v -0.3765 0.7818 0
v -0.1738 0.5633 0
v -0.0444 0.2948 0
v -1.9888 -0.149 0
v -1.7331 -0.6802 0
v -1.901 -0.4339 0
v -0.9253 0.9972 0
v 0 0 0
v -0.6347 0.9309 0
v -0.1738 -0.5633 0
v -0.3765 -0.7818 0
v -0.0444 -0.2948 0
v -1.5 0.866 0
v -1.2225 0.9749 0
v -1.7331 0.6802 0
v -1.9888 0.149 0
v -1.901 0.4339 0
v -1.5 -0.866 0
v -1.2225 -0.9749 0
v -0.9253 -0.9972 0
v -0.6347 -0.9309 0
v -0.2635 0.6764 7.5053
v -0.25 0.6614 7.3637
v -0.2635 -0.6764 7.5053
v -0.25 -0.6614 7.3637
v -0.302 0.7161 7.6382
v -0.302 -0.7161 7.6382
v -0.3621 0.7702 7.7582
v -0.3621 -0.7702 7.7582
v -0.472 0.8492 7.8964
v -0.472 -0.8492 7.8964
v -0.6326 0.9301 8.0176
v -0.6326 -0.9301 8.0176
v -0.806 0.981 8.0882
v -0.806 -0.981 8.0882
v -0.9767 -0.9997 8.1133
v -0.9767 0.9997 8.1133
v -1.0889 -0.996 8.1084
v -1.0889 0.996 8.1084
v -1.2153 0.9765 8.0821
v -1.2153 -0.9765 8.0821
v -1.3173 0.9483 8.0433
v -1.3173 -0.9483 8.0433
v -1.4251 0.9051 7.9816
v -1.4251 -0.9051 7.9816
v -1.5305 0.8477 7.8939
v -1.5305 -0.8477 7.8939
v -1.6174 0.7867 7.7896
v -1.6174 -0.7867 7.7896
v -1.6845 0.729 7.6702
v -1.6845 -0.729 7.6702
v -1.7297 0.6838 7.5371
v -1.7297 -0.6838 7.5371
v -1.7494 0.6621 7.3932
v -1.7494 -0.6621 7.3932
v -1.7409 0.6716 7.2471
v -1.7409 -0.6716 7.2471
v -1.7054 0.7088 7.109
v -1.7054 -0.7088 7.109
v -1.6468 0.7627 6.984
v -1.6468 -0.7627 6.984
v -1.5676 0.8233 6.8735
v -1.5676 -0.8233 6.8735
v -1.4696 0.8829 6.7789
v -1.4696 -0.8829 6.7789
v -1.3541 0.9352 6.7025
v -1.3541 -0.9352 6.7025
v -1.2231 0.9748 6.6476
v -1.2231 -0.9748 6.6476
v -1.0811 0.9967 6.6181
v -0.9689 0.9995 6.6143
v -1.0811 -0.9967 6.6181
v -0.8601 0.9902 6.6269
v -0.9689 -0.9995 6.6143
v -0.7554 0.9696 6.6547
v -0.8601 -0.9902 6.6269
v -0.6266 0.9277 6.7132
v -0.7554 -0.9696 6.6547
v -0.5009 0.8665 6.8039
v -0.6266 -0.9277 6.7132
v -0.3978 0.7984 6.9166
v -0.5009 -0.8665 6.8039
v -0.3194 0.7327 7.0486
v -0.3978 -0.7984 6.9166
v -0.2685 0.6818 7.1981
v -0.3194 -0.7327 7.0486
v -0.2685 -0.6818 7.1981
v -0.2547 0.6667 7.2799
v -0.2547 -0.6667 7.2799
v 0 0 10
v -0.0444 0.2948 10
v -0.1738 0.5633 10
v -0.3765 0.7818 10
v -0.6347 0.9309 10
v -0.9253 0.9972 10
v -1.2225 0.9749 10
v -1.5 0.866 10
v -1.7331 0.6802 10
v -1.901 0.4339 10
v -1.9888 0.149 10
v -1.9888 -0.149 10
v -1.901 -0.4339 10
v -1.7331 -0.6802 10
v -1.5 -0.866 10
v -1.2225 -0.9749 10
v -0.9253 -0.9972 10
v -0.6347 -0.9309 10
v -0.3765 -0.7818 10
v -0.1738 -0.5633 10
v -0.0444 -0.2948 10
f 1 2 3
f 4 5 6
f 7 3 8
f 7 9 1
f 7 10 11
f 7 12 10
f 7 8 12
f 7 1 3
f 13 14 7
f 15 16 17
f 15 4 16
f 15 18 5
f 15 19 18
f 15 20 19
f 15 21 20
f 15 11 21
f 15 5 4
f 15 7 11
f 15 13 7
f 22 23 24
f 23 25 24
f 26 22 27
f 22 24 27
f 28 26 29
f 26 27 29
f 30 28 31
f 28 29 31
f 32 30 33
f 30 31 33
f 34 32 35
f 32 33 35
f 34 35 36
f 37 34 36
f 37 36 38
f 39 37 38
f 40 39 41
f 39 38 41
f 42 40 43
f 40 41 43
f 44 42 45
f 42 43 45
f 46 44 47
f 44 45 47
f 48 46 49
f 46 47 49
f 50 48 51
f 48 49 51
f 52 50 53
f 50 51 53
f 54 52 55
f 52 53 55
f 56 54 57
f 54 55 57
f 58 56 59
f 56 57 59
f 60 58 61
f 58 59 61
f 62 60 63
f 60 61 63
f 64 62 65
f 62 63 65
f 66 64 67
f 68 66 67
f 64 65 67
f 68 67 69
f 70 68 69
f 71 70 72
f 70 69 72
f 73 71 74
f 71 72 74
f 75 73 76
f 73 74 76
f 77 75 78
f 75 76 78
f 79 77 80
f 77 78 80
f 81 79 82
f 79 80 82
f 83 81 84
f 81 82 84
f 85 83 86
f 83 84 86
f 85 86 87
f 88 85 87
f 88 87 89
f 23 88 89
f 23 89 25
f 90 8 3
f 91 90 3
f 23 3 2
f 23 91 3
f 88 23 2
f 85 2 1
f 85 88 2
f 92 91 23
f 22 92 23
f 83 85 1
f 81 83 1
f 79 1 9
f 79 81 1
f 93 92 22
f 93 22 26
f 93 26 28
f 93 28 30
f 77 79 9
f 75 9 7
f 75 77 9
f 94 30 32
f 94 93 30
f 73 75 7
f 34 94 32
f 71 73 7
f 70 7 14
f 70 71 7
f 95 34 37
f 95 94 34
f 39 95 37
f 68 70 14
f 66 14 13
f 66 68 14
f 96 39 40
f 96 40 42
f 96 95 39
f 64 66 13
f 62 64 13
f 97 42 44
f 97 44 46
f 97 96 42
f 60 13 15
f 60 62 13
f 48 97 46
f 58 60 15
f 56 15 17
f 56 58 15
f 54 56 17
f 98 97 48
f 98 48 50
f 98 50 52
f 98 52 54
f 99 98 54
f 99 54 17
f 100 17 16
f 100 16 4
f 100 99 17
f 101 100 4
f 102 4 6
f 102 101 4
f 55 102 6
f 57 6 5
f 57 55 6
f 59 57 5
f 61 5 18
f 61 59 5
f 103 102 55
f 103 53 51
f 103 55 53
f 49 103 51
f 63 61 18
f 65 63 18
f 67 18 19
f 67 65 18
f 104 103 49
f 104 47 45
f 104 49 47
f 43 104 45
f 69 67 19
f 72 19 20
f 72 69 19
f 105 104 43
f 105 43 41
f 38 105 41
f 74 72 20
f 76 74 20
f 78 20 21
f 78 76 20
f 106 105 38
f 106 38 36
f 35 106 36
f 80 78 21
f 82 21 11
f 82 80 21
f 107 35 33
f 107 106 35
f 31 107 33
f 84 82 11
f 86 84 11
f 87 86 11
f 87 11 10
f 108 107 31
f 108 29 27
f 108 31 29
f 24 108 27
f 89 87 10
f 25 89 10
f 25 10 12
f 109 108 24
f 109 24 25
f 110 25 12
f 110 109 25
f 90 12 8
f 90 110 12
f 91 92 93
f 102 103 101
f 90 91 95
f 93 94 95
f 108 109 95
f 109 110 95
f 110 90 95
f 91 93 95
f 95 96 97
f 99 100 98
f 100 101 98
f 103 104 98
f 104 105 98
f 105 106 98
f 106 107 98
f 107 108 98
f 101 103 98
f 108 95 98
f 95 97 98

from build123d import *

# Parameters (mm, degrees)
F0_W     = 1
F0_H     = 10
F2_R     = 0.75
F3_DEPTH = 250
F4_DEPTH = 25


with BuildPart() as f1:
    # F0 (on Front) → F1 (revolve)
    with BuildSketch(Plane.XZ):
        with Locations((-0.5, 5)):
            Rectangle(F0_W, F0_H)
    revolve(axis=Axis((-1, 0, 5), (0, 0, 1)))

    # F2 (on Front) → F3 (cut)
    with BuildSketch(Plane.XZ):
        with Locations((-1, 7.363699)):
            Circle(F2_R)
    extrude(amount=-F3_DEPTH, mode=Mode.SUBTRACT)

    # F2 (on Front) → F4 (cut)
    with BuildSketch(Plane.XZ):
        with Locations((-1, 7.363699)):
            Circle(F2_R)
    extrude(amount=F4_DEPTH, mode=Mode.SUBTRACT)


solid = f1.part
